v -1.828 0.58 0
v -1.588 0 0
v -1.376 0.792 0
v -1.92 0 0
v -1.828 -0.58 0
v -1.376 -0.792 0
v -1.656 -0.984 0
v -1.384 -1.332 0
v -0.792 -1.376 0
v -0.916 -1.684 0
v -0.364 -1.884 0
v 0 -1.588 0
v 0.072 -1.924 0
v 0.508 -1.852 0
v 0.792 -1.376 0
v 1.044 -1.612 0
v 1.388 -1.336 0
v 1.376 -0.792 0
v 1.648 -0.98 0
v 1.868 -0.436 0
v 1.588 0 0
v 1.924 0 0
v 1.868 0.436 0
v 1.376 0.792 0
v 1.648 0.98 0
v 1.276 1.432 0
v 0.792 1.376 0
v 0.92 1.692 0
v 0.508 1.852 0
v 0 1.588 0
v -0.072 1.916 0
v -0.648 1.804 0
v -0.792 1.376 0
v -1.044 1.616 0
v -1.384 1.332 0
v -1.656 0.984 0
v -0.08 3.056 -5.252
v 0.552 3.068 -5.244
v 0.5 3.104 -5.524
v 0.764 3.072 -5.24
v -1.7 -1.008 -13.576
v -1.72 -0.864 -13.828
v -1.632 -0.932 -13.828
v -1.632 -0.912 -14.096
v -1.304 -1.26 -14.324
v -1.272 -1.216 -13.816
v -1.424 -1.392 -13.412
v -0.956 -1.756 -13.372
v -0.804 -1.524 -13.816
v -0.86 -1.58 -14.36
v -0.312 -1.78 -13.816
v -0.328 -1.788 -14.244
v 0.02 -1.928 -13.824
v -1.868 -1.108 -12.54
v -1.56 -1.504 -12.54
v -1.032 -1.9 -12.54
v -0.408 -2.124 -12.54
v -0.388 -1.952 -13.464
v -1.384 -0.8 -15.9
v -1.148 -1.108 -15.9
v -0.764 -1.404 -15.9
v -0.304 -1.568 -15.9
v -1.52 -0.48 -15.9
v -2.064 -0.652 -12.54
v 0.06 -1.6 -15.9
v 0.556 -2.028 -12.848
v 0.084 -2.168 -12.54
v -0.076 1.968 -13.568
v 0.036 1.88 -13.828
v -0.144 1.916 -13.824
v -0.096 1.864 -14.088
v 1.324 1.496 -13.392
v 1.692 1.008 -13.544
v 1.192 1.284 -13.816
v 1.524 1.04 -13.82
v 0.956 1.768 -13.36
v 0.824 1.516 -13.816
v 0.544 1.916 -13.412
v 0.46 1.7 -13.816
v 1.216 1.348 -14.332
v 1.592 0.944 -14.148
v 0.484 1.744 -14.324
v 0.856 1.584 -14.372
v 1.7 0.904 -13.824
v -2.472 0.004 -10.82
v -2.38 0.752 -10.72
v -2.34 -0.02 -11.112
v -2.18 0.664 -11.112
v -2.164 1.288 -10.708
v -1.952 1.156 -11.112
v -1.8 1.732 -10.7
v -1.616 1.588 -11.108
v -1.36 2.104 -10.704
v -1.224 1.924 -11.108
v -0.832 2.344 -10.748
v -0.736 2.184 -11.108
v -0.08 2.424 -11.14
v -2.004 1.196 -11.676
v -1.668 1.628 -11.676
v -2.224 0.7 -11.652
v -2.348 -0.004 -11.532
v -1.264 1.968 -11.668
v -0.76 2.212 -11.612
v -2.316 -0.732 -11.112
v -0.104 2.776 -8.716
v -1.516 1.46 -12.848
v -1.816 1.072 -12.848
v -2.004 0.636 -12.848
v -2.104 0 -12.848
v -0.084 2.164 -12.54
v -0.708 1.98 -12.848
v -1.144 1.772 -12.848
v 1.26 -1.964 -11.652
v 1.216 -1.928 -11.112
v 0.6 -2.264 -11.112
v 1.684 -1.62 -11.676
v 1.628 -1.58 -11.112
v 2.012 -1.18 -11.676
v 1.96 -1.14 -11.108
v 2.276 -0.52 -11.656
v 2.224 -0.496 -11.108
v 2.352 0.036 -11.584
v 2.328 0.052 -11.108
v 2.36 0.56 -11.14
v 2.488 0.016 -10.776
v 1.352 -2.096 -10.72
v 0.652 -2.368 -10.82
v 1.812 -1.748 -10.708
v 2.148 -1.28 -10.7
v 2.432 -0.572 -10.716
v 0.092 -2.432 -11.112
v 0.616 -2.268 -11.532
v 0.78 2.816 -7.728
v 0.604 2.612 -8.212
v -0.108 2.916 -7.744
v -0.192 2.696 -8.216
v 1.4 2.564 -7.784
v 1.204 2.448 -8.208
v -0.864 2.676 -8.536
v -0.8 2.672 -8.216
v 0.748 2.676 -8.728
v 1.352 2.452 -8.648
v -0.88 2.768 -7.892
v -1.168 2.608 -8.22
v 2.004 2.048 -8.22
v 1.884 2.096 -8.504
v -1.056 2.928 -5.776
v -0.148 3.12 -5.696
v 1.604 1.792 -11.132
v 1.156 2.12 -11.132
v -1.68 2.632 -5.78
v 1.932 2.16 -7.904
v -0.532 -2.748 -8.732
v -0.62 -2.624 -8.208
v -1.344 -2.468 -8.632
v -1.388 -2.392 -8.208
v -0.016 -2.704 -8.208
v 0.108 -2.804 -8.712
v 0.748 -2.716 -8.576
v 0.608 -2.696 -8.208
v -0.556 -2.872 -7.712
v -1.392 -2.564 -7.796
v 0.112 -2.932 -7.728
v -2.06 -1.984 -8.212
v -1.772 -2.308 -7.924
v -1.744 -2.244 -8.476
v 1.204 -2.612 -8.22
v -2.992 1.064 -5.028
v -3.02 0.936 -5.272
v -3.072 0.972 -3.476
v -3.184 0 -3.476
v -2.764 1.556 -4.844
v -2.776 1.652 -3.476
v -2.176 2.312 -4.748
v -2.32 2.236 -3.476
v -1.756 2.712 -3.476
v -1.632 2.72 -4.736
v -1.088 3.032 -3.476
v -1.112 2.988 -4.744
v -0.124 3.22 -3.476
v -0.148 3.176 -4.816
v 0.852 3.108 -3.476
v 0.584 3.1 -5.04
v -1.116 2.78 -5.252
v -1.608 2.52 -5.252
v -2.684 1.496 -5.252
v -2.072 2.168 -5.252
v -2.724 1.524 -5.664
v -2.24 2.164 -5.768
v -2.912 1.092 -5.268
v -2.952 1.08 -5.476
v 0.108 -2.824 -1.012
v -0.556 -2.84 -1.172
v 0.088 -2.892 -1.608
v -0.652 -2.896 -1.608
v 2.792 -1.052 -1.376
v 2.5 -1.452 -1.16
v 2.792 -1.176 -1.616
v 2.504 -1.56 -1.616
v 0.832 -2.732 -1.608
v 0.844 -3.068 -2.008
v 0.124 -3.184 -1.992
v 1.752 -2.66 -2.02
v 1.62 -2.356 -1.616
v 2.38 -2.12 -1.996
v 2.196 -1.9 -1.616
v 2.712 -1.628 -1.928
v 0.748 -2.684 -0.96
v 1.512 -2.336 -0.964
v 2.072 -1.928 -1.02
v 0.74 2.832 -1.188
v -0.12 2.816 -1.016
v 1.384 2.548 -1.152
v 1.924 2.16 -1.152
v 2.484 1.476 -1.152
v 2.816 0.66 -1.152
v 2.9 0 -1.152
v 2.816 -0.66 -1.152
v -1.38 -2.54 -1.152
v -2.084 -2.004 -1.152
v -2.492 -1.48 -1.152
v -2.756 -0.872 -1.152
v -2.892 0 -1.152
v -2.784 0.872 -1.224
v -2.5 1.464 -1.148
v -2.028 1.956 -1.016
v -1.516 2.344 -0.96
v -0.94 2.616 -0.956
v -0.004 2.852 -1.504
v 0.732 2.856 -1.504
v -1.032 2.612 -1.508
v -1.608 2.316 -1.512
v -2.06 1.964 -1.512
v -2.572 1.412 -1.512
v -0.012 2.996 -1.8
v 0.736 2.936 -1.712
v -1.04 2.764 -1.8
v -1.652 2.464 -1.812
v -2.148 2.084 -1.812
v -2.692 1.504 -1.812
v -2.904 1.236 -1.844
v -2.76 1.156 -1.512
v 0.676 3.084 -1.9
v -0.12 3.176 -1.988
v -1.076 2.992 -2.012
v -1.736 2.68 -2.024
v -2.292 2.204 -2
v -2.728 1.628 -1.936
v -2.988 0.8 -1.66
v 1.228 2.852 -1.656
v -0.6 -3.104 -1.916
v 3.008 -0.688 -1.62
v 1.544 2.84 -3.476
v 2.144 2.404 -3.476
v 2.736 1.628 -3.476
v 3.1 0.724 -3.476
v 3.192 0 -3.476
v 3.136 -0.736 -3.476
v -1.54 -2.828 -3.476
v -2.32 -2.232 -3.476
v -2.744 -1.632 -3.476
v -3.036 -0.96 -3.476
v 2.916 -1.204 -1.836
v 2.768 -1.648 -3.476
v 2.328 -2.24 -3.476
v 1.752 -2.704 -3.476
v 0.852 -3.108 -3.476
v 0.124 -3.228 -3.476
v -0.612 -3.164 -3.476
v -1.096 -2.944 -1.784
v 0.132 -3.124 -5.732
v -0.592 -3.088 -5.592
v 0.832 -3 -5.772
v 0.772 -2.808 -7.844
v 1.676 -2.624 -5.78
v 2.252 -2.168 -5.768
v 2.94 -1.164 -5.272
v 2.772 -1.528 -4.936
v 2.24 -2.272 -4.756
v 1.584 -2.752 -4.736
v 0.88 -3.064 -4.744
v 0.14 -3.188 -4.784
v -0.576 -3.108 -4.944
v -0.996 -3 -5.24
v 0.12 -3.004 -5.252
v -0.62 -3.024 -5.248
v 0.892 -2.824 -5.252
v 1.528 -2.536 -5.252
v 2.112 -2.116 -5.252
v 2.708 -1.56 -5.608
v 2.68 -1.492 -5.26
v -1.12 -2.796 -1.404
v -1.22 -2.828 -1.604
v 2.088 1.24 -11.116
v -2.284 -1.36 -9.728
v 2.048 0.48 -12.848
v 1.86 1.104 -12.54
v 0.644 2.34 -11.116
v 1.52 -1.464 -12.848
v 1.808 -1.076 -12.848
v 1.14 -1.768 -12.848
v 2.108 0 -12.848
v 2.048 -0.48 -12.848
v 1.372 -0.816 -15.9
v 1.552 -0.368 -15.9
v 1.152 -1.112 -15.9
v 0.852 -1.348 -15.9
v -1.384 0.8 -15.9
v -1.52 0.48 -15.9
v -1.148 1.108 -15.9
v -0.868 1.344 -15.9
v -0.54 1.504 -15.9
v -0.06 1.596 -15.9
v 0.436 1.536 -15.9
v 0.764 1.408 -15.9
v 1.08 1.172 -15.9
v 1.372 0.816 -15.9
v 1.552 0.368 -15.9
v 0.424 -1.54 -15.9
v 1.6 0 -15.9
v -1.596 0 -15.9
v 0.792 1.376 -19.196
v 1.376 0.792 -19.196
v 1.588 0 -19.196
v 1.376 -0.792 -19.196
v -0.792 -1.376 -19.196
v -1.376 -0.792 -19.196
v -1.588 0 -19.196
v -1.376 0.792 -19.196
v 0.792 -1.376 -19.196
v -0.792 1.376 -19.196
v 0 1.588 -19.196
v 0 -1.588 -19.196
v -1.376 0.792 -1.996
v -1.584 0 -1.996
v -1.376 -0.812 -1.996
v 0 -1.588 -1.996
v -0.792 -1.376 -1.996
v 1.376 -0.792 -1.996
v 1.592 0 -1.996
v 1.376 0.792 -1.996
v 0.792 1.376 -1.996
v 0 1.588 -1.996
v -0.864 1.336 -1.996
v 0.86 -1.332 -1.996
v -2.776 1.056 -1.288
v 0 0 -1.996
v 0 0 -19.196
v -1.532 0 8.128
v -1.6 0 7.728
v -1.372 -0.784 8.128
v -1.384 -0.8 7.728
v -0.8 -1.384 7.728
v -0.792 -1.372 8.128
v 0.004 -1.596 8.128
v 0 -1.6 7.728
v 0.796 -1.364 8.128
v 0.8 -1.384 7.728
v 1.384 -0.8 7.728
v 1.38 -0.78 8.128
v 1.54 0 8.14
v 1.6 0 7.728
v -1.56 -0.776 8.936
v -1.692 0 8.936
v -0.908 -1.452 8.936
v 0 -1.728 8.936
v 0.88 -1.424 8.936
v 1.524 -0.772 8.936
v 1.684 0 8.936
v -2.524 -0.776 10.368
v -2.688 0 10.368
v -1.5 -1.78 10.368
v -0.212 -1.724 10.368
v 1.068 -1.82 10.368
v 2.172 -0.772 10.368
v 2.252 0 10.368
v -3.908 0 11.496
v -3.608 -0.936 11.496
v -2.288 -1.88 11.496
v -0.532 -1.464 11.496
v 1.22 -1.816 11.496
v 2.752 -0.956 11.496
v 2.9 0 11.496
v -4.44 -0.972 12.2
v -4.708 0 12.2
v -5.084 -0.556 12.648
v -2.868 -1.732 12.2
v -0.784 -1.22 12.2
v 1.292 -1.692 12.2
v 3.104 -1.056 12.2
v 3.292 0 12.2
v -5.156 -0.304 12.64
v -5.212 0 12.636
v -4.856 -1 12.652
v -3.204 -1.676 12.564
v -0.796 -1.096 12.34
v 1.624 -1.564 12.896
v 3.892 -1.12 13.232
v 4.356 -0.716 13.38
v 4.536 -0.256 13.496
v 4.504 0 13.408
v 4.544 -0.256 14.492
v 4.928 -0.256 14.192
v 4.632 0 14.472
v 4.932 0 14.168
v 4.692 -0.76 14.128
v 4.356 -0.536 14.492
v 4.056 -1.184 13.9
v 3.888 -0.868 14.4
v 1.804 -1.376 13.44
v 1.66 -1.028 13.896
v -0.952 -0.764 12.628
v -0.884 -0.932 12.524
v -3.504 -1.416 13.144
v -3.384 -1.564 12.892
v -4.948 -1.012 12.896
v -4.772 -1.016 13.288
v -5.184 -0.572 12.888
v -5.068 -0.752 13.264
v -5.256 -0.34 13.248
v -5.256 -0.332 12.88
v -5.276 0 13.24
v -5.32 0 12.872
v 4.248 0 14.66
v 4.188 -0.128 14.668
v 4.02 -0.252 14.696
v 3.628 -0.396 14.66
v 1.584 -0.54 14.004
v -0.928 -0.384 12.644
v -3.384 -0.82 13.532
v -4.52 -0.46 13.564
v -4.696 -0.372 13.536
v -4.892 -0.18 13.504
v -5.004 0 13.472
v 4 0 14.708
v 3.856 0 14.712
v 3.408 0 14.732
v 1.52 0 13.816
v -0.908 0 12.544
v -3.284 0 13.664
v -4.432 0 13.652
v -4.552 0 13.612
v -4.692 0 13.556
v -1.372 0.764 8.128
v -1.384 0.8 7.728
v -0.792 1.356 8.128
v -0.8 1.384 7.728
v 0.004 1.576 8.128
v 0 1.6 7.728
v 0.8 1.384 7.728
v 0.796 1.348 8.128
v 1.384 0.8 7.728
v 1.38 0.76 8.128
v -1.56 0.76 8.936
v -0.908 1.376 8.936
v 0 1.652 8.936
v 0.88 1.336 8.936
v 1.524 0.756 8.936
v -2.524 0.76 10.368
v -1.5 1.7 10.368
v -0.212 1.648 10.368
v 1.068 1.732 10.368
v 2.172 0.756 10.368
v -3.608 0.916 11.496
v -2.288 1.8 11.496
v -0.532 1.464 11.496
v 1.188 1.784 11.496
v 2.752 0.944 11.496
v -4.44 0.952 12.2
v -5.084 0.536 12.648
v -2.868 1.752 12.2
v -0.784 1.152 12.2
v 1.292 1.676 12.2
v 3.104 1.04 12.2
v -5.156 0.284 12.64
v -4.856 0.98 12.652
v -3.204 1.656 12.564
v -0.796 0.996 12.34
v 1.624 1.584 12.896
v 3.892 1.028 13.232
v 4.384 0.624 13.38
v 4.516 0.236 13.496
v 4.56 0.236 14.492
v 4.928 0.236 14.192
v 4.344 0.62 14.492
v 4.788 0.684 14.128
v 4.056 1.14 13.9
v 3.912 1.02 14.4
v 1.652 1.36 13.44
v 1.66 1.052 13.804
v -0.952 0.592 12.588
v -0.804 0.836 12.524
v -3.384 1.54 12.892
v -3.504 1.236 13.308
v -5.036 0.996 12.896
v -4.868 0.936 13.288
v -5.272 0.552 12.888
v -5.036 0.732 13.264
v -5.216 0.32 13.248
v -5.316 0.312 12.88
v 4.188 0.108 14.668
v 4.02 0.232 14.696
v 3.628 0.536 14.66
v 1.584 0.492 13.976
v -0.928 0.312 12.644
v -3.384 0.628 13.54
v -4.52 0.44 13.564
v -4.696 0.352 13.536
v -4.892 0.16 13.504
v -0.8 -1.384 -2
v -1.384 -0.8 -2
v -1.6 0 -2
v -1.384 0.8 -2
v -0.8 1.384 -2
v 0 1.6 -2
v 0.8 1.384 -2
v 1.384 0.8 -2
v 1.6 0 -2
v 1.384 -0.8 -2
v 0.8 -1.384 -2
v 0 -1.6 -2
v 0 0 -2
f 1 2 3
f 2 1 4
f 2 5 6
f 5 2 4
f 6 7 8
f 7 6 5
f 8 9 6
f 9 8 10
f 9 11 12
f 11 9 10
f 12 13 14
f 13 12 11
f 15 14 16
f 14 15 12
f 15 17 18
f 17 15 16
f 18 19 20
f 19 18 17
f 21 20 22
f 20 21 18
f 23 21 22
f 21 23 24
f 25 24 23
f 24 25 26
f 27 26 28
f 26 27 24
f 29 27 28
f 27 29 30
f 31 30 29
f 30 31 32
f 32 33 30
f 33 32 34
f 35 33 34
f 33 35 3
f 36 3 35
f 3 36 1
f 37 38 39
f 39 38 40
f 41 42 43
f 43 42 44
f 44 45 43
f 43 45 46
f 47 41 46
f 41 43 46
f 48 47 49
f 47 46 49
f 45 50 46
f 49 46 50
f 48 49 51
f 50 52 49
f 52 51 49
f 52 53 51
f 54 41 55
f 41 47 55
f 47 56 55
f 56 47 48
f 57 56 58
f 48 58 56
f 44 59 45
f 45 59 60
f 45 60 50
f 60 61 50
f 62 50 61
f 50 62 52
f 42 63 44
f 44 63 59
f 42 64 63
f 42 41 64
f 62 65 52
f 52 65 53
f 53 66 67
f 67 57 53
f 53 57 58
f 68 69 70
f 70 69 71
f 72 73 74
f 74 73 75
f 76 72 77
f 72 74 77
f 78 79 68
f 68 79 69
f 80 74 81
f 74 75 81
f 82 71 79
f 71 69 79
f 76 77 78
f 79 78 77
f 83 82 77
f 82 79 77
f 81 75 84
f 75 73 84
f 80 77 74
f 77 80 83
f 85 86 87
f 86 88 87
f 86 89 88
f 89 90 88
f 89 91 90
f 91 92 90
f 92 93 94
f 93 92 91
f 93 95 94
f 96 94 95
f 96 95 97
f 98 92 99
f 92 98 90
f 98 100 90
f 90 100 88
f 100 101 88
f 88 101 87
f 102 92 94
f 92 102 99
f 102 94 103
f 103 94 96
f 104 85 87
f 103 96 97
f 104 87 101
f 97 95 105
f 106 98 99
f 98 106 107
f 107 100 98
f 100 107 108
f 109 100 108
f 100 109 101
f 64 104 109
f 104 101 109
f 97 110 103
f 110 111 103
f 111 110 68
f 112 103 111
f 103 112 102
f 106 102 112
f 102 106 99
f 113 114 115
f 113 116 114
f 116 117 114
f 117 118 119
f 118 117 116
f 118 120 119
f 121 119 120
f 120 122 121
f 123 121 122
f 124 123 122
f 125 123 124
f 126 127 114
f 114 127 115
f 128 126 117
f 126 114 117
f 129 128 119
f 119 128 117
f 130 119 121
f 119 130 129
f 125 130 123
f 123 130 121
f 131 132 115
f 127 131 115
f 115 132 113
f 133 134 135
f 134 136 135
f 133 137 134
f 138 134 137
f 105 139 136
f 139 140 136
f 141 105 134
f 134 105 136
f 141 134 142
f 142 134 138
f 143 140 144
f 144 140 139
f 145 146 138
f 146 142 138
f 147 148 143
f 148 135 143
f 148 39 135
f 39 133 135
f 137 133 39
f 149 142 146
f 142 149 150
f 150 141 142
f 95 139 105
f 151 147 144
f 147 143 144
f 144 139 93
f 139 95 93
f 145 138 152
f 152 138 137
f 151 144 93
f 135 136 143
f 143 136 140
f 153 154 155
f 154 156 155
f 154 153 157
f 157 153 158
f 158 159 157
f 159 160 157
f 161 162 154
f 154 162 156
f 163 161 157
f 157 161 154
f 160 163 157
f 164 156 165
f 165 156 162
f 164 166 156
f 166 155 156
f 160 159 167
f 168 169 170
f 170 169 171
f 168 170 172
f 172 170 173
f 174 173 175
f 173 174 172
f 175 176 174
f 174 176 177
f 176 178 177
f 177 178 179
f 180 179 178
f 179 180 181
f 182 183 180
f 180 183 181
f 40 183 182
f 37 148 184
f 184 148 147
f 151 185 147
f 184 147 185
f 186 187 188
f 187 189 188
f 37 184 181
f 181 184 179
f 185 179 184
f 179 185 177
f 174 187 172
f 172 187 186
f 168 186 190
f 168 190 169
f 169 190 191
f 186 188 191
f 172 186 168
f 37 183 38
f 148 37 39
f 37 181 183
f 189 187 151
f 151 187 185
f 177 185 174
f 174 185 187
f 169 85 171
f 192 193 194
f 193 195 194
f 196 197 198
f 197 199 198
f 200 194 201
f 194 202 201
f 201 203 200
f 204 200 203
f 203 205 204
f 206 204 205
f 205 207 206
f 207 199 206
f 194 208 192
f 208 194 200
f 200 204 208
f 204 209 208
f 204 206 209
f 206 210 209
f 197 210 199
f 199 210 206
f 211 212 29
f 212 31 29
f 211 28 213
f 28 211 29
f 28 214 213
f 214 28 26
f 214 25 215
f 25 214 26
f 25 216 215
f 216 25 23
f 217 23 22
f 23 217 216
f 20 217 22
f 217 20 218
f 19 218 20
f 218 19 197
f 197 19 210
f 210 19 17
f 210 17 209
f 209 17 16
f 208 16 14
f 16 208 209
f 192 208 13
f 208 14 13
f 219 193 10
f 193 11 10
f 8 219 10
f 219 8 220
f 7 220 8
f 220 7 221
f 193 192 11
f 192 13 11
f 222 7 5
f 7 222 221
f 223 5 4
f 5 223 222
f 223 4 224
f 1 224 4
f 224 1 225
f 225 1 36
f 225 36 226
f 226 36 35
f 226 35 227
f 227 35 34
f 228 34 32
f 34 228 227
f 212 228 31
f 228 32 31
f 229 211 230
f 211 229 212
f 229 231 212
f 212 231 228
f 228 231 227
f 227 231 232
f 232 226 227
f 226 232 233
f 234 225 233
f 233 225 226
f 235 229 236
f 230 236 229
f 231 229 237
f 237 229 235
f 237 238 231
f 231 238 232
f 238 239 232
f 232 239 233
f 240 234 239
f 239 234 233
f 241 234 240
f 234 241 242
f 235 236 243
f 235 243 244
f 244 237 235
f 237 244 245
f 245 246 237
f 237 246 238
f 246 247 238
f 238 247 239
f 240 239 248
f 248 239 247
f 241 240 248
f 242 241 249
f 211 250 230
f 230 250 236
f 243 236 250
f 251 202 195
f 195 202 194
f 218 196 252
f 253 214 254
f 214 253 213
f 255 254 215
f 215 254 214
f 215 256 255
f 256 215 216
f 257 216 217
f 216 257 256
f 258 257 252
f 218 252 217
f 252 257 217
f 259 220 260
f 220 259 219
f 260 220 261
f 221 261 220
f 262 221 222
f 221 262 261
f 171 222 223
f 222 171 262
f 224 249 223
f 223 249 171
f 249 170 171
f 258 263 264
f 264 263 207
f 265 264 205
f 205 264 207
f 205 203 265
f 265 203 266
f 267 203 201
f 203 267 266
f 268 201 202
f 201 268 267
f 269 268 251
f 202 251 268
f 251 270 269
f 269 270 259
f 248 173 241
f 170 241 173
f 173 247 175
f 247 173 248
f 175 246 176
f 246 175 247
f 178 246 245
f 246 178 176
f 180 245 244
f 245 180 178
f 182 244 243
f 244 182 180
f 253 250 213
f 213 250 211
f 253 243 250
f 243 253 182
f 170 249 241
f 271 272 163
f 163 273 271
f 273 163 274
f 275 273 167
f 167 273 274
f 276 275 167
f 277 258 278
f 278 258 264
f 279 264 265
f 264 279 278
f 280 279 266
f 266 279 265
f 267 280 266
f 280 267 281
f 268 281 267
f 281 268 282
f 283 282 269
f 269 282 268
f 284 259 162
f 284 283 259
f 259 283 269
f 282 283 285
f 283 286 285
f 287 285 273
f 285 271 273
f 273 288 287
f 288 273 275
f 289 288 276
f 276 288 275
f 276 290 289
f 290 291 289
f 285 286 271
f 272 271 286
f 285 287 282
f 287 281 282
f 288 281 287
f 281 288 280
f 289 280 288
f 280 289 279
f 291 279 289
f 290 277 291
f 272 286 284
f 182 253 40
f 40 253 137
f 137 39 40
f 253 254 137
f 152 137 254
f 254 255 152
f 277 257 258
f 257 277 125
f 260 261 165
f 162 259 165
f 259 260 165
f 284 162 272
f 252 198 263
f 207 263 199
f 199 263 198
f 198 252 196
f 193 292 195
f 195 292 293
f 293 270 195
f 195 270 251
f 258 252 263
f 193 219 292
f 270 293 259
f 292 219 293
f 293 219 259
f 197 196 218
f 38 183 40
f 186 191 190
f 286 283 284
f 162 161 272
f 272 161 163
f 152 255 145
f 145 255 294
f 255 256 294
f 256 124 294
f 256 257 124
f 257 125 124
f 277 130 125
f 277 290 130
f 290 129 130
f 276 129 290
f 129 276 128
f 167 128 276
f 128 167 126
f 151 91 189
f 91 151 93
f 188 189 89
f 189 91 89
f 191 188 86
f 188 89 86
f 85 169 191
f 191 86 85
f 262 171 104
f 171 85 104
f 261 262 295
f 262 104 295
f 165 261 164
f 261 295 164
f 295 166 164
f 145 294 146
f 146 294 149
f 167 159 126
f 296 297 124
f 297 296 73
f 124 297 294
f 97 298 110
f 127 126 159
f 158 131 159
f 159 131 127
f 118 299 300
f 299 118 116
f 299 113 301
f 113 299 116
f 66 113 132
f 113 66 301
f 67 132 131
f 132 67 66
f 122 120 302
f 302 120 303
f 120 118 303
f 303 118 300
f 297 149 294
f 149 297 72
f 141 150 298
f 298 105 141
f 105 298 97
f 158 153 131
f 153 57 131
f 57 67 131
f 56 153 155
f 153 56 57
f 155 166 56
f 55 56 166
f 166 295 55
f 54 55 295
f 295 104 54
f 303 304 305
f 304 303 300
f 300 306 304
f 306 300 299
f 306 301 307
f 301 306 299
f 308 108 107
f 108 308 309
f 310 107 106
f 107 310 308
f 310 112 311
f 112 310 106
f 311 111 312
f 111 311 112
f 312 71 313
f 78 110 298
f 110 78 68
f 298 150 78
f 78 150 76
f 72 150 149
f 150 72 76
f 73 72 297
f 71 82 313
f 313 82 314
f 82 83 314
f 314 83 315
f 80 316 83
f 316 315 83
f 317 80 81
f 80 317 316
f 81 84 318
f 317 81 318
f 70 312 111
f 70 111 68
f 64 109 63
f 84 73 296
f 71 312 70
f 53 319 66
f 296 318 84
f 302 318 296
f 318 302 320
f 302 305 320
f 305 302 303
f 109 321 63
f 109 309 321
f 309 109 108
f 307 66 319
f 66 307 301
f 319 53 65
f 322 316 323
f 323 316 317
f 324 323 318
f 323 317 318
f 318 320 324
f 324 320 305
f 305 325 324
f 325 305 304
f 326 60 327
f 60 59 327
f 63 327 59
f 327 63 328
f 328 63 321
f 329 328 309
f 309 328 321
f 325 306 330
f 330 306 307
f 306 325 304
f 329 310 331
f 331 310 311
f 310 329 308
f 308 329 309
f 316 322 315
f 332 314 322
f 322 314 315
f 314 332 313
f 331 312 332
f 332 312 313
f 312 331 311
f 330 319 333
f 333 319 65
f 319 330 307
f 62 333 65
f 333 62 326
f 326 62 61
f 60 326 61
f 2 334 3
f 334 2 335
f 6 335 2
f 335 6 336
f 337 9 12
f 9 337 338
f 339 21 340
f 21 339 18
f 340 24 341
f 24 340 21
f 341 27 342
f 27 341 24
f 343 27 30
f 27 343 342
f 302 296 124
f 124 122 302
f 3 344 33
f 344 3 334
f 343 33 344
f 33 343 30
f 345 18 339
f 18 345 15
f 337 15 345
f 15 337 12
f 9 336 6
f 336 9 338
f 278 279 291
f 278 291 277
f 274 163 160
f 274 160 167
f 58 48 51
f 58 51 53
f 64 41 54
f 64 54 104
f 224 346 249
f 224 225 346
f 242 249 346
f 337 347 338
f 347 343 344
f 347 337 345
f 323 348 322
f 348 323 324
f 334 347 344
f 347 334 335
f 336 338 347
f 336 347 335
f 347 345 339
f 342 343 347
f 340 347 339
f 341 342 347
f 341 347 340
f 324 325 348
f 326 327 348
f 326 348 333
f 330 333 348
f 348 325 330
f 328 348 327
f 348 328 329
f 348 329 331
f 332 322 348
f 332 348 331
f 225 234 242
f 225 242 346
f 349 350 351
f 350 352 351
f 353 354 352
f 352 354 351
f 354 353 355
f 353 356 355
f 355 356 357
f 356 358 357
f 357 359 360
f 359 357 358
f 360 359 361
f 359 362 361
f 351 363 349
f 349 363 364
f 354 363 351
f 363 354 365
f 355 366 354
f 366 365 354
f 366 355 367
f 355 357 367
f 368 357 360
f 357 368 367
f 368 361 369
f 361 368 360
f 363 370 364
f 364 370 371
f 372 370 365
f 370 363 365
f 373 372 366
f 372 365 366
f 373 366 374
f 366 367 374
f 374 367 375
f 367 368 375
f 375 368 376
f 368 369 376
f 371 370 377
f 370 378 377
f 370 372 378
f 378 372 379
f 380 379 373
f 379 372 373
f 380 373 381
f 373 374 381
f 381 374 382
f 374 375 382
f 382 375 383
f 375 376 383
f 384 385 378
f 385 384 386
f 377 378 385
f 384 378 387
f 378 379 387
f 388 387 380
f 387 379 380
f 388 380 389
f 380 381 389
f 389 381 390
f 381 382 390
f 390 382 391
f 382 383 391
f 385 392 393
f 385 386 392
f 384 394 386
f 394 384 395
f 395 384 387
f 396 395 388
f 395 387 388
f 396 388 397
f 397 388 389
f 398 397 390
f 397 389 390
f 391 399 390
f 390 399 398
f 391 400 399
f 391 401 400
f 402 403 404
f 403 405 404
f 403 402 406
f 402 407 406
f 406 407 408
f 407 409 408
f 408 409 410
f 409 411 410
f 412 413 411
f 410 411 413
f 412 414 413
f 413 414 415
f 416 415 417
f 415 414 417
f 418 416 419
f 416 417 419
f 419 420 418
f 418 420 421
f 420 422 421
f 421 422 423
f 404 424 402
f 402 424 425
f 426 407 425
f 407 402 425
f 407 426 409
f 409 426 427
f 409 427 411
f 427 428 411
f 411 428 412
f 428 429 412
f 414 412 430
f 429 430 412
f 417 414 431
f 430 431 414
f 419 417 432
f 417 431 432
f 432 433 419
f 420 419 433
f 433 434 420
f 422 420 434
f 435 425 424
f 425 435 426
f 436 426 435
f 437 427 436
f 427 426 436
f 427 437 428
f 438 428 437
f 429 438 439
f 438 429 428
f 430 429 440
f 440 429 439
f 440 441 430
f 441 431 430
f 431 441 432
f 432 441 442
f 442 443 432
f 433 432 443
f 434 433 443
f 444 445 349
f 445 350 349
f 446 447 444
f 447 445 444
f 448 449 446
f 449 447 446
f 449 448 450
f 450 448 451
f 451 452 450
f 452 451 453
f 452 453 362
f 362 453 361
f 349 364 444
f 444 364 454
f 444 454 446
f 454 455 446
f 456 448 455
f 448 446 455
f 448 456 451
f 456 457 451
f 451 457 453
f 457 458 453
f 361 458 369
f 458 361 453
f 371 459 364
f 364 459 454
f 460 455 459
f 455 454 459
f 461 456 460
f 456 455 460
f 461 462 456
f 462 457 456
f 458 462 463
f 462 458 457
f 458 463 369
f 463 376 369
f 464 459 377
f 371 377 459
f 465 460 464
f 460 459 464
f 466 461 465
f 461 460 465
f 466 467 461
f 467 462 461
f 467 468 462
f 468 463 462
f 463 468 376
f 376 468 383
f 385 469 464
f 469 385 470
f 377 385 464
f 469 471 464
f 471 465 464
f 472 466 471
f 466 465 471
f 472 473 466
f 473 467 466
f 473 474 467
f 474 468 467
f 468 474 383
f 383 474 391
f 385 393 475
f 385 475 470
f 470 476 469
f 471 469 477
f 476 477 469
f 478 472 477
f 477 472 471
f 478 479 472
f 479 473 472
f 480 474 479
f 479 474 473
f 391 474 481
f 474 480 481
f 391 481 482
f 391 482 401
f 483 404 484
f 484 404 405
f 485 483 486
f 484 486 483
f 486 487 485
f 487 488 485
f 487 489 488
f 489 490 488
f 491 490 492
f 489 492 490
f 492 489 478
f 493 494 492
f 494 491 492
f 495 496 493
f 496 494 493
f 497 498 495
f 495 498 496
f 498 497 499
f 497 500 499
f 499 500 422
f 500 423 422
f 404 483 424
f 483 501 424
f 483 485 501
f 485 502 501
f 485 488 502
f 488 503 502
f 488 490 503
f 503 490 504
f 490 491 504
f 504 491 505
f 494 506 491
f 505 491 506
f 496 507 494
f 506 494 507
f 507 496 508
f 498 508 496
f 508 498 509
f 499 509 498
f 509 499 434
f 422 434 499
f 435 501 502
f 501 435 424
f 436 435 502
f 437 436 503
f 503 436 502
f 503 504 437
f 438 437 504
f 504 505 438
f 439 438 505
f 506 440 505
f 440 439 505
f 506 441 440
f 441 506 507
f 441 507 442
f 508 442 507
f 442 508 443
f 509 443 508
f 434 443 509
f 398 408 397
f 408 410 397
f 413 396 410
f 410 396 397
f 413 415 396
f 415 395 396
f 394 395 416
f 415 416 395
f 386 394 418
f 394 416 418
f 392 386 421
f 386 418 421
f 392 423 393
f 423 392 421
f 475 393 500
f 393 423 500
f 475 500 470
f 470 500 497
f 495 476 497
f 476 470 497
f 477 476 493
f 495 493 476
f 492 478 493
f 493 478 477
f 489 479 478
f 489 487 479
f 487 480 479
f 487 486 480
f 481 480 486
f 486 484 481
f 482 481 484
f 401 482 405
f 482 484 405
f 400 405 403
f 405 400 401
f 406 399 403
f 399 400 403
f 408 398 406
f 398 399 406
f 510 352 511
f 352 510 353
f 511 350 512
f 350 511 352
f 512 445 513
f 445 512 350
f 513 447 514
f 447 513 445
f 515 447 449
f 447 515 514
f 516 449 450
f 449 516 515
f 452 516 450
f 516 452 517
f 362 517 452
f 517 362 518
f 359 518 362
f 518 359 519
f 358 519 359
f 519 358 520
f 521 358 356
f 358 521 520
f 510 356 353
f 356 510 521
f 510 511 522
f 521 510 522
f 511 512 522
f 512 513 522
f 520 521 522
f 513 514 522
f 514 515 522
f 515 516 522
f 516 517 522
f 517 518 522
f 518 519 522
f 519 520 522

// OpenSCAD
use <../lib.scad>
use <33172.scad>
use <33183.scad>
$fa=1; $fs=0.2;
function ldraw_lib__33172c01(realsolid=false) = [
// 0 Minifig Food Carrot with Green Leaves (Complete)
// 0 Name: 33172c01.dat
// 0 Author: Steffen [Steffen]
// 0 !LDRAW_ORG Shortcut UPDATE 2012-01
// 0 !LICENSE Licensed under CC BY 2.0 and CC BY 4.0 : see CAreadme.txt
// 
// 0 BFC CERTIFY CCW
  [0,"BFC","CERTIFY"],
  [0,"BFC","CCW"],
// 
// 0 !CATEGORY Minifig Accessory
// 
// 0 !CMDLINE -c25
// 
// 0 !HISTORY 2012-03-30 [PTadmin] Official Update 2012-01
// 
// 
// 1 16 0 0 0 1 0 0 0 1 0 0 0 1 33172.dat
  [1,16,0,0,0,1,0,0,0,1,0,0,0,1, ldraw_lib__33172(realsolid)],
// 1 2 0 5 0 1 0 0 0 1 0 0 0 1 33183.dat
  [1,2,0,5,0,1,0,0,0,1,0,0,0,1, ldraw_lib__33183(realsolid)],
// 
];
module ldraw_lib__33172c01(step=0, col=false, unit=2/5, alt=false, line=0.2, solid=!$preview)
    makepoly(ldraw_lib__33172c01(solid), step=step, col=col, unit=unit, alt=alt, line=line, solid=solid);
ldraw_lib__33172c01(line=0.2);
